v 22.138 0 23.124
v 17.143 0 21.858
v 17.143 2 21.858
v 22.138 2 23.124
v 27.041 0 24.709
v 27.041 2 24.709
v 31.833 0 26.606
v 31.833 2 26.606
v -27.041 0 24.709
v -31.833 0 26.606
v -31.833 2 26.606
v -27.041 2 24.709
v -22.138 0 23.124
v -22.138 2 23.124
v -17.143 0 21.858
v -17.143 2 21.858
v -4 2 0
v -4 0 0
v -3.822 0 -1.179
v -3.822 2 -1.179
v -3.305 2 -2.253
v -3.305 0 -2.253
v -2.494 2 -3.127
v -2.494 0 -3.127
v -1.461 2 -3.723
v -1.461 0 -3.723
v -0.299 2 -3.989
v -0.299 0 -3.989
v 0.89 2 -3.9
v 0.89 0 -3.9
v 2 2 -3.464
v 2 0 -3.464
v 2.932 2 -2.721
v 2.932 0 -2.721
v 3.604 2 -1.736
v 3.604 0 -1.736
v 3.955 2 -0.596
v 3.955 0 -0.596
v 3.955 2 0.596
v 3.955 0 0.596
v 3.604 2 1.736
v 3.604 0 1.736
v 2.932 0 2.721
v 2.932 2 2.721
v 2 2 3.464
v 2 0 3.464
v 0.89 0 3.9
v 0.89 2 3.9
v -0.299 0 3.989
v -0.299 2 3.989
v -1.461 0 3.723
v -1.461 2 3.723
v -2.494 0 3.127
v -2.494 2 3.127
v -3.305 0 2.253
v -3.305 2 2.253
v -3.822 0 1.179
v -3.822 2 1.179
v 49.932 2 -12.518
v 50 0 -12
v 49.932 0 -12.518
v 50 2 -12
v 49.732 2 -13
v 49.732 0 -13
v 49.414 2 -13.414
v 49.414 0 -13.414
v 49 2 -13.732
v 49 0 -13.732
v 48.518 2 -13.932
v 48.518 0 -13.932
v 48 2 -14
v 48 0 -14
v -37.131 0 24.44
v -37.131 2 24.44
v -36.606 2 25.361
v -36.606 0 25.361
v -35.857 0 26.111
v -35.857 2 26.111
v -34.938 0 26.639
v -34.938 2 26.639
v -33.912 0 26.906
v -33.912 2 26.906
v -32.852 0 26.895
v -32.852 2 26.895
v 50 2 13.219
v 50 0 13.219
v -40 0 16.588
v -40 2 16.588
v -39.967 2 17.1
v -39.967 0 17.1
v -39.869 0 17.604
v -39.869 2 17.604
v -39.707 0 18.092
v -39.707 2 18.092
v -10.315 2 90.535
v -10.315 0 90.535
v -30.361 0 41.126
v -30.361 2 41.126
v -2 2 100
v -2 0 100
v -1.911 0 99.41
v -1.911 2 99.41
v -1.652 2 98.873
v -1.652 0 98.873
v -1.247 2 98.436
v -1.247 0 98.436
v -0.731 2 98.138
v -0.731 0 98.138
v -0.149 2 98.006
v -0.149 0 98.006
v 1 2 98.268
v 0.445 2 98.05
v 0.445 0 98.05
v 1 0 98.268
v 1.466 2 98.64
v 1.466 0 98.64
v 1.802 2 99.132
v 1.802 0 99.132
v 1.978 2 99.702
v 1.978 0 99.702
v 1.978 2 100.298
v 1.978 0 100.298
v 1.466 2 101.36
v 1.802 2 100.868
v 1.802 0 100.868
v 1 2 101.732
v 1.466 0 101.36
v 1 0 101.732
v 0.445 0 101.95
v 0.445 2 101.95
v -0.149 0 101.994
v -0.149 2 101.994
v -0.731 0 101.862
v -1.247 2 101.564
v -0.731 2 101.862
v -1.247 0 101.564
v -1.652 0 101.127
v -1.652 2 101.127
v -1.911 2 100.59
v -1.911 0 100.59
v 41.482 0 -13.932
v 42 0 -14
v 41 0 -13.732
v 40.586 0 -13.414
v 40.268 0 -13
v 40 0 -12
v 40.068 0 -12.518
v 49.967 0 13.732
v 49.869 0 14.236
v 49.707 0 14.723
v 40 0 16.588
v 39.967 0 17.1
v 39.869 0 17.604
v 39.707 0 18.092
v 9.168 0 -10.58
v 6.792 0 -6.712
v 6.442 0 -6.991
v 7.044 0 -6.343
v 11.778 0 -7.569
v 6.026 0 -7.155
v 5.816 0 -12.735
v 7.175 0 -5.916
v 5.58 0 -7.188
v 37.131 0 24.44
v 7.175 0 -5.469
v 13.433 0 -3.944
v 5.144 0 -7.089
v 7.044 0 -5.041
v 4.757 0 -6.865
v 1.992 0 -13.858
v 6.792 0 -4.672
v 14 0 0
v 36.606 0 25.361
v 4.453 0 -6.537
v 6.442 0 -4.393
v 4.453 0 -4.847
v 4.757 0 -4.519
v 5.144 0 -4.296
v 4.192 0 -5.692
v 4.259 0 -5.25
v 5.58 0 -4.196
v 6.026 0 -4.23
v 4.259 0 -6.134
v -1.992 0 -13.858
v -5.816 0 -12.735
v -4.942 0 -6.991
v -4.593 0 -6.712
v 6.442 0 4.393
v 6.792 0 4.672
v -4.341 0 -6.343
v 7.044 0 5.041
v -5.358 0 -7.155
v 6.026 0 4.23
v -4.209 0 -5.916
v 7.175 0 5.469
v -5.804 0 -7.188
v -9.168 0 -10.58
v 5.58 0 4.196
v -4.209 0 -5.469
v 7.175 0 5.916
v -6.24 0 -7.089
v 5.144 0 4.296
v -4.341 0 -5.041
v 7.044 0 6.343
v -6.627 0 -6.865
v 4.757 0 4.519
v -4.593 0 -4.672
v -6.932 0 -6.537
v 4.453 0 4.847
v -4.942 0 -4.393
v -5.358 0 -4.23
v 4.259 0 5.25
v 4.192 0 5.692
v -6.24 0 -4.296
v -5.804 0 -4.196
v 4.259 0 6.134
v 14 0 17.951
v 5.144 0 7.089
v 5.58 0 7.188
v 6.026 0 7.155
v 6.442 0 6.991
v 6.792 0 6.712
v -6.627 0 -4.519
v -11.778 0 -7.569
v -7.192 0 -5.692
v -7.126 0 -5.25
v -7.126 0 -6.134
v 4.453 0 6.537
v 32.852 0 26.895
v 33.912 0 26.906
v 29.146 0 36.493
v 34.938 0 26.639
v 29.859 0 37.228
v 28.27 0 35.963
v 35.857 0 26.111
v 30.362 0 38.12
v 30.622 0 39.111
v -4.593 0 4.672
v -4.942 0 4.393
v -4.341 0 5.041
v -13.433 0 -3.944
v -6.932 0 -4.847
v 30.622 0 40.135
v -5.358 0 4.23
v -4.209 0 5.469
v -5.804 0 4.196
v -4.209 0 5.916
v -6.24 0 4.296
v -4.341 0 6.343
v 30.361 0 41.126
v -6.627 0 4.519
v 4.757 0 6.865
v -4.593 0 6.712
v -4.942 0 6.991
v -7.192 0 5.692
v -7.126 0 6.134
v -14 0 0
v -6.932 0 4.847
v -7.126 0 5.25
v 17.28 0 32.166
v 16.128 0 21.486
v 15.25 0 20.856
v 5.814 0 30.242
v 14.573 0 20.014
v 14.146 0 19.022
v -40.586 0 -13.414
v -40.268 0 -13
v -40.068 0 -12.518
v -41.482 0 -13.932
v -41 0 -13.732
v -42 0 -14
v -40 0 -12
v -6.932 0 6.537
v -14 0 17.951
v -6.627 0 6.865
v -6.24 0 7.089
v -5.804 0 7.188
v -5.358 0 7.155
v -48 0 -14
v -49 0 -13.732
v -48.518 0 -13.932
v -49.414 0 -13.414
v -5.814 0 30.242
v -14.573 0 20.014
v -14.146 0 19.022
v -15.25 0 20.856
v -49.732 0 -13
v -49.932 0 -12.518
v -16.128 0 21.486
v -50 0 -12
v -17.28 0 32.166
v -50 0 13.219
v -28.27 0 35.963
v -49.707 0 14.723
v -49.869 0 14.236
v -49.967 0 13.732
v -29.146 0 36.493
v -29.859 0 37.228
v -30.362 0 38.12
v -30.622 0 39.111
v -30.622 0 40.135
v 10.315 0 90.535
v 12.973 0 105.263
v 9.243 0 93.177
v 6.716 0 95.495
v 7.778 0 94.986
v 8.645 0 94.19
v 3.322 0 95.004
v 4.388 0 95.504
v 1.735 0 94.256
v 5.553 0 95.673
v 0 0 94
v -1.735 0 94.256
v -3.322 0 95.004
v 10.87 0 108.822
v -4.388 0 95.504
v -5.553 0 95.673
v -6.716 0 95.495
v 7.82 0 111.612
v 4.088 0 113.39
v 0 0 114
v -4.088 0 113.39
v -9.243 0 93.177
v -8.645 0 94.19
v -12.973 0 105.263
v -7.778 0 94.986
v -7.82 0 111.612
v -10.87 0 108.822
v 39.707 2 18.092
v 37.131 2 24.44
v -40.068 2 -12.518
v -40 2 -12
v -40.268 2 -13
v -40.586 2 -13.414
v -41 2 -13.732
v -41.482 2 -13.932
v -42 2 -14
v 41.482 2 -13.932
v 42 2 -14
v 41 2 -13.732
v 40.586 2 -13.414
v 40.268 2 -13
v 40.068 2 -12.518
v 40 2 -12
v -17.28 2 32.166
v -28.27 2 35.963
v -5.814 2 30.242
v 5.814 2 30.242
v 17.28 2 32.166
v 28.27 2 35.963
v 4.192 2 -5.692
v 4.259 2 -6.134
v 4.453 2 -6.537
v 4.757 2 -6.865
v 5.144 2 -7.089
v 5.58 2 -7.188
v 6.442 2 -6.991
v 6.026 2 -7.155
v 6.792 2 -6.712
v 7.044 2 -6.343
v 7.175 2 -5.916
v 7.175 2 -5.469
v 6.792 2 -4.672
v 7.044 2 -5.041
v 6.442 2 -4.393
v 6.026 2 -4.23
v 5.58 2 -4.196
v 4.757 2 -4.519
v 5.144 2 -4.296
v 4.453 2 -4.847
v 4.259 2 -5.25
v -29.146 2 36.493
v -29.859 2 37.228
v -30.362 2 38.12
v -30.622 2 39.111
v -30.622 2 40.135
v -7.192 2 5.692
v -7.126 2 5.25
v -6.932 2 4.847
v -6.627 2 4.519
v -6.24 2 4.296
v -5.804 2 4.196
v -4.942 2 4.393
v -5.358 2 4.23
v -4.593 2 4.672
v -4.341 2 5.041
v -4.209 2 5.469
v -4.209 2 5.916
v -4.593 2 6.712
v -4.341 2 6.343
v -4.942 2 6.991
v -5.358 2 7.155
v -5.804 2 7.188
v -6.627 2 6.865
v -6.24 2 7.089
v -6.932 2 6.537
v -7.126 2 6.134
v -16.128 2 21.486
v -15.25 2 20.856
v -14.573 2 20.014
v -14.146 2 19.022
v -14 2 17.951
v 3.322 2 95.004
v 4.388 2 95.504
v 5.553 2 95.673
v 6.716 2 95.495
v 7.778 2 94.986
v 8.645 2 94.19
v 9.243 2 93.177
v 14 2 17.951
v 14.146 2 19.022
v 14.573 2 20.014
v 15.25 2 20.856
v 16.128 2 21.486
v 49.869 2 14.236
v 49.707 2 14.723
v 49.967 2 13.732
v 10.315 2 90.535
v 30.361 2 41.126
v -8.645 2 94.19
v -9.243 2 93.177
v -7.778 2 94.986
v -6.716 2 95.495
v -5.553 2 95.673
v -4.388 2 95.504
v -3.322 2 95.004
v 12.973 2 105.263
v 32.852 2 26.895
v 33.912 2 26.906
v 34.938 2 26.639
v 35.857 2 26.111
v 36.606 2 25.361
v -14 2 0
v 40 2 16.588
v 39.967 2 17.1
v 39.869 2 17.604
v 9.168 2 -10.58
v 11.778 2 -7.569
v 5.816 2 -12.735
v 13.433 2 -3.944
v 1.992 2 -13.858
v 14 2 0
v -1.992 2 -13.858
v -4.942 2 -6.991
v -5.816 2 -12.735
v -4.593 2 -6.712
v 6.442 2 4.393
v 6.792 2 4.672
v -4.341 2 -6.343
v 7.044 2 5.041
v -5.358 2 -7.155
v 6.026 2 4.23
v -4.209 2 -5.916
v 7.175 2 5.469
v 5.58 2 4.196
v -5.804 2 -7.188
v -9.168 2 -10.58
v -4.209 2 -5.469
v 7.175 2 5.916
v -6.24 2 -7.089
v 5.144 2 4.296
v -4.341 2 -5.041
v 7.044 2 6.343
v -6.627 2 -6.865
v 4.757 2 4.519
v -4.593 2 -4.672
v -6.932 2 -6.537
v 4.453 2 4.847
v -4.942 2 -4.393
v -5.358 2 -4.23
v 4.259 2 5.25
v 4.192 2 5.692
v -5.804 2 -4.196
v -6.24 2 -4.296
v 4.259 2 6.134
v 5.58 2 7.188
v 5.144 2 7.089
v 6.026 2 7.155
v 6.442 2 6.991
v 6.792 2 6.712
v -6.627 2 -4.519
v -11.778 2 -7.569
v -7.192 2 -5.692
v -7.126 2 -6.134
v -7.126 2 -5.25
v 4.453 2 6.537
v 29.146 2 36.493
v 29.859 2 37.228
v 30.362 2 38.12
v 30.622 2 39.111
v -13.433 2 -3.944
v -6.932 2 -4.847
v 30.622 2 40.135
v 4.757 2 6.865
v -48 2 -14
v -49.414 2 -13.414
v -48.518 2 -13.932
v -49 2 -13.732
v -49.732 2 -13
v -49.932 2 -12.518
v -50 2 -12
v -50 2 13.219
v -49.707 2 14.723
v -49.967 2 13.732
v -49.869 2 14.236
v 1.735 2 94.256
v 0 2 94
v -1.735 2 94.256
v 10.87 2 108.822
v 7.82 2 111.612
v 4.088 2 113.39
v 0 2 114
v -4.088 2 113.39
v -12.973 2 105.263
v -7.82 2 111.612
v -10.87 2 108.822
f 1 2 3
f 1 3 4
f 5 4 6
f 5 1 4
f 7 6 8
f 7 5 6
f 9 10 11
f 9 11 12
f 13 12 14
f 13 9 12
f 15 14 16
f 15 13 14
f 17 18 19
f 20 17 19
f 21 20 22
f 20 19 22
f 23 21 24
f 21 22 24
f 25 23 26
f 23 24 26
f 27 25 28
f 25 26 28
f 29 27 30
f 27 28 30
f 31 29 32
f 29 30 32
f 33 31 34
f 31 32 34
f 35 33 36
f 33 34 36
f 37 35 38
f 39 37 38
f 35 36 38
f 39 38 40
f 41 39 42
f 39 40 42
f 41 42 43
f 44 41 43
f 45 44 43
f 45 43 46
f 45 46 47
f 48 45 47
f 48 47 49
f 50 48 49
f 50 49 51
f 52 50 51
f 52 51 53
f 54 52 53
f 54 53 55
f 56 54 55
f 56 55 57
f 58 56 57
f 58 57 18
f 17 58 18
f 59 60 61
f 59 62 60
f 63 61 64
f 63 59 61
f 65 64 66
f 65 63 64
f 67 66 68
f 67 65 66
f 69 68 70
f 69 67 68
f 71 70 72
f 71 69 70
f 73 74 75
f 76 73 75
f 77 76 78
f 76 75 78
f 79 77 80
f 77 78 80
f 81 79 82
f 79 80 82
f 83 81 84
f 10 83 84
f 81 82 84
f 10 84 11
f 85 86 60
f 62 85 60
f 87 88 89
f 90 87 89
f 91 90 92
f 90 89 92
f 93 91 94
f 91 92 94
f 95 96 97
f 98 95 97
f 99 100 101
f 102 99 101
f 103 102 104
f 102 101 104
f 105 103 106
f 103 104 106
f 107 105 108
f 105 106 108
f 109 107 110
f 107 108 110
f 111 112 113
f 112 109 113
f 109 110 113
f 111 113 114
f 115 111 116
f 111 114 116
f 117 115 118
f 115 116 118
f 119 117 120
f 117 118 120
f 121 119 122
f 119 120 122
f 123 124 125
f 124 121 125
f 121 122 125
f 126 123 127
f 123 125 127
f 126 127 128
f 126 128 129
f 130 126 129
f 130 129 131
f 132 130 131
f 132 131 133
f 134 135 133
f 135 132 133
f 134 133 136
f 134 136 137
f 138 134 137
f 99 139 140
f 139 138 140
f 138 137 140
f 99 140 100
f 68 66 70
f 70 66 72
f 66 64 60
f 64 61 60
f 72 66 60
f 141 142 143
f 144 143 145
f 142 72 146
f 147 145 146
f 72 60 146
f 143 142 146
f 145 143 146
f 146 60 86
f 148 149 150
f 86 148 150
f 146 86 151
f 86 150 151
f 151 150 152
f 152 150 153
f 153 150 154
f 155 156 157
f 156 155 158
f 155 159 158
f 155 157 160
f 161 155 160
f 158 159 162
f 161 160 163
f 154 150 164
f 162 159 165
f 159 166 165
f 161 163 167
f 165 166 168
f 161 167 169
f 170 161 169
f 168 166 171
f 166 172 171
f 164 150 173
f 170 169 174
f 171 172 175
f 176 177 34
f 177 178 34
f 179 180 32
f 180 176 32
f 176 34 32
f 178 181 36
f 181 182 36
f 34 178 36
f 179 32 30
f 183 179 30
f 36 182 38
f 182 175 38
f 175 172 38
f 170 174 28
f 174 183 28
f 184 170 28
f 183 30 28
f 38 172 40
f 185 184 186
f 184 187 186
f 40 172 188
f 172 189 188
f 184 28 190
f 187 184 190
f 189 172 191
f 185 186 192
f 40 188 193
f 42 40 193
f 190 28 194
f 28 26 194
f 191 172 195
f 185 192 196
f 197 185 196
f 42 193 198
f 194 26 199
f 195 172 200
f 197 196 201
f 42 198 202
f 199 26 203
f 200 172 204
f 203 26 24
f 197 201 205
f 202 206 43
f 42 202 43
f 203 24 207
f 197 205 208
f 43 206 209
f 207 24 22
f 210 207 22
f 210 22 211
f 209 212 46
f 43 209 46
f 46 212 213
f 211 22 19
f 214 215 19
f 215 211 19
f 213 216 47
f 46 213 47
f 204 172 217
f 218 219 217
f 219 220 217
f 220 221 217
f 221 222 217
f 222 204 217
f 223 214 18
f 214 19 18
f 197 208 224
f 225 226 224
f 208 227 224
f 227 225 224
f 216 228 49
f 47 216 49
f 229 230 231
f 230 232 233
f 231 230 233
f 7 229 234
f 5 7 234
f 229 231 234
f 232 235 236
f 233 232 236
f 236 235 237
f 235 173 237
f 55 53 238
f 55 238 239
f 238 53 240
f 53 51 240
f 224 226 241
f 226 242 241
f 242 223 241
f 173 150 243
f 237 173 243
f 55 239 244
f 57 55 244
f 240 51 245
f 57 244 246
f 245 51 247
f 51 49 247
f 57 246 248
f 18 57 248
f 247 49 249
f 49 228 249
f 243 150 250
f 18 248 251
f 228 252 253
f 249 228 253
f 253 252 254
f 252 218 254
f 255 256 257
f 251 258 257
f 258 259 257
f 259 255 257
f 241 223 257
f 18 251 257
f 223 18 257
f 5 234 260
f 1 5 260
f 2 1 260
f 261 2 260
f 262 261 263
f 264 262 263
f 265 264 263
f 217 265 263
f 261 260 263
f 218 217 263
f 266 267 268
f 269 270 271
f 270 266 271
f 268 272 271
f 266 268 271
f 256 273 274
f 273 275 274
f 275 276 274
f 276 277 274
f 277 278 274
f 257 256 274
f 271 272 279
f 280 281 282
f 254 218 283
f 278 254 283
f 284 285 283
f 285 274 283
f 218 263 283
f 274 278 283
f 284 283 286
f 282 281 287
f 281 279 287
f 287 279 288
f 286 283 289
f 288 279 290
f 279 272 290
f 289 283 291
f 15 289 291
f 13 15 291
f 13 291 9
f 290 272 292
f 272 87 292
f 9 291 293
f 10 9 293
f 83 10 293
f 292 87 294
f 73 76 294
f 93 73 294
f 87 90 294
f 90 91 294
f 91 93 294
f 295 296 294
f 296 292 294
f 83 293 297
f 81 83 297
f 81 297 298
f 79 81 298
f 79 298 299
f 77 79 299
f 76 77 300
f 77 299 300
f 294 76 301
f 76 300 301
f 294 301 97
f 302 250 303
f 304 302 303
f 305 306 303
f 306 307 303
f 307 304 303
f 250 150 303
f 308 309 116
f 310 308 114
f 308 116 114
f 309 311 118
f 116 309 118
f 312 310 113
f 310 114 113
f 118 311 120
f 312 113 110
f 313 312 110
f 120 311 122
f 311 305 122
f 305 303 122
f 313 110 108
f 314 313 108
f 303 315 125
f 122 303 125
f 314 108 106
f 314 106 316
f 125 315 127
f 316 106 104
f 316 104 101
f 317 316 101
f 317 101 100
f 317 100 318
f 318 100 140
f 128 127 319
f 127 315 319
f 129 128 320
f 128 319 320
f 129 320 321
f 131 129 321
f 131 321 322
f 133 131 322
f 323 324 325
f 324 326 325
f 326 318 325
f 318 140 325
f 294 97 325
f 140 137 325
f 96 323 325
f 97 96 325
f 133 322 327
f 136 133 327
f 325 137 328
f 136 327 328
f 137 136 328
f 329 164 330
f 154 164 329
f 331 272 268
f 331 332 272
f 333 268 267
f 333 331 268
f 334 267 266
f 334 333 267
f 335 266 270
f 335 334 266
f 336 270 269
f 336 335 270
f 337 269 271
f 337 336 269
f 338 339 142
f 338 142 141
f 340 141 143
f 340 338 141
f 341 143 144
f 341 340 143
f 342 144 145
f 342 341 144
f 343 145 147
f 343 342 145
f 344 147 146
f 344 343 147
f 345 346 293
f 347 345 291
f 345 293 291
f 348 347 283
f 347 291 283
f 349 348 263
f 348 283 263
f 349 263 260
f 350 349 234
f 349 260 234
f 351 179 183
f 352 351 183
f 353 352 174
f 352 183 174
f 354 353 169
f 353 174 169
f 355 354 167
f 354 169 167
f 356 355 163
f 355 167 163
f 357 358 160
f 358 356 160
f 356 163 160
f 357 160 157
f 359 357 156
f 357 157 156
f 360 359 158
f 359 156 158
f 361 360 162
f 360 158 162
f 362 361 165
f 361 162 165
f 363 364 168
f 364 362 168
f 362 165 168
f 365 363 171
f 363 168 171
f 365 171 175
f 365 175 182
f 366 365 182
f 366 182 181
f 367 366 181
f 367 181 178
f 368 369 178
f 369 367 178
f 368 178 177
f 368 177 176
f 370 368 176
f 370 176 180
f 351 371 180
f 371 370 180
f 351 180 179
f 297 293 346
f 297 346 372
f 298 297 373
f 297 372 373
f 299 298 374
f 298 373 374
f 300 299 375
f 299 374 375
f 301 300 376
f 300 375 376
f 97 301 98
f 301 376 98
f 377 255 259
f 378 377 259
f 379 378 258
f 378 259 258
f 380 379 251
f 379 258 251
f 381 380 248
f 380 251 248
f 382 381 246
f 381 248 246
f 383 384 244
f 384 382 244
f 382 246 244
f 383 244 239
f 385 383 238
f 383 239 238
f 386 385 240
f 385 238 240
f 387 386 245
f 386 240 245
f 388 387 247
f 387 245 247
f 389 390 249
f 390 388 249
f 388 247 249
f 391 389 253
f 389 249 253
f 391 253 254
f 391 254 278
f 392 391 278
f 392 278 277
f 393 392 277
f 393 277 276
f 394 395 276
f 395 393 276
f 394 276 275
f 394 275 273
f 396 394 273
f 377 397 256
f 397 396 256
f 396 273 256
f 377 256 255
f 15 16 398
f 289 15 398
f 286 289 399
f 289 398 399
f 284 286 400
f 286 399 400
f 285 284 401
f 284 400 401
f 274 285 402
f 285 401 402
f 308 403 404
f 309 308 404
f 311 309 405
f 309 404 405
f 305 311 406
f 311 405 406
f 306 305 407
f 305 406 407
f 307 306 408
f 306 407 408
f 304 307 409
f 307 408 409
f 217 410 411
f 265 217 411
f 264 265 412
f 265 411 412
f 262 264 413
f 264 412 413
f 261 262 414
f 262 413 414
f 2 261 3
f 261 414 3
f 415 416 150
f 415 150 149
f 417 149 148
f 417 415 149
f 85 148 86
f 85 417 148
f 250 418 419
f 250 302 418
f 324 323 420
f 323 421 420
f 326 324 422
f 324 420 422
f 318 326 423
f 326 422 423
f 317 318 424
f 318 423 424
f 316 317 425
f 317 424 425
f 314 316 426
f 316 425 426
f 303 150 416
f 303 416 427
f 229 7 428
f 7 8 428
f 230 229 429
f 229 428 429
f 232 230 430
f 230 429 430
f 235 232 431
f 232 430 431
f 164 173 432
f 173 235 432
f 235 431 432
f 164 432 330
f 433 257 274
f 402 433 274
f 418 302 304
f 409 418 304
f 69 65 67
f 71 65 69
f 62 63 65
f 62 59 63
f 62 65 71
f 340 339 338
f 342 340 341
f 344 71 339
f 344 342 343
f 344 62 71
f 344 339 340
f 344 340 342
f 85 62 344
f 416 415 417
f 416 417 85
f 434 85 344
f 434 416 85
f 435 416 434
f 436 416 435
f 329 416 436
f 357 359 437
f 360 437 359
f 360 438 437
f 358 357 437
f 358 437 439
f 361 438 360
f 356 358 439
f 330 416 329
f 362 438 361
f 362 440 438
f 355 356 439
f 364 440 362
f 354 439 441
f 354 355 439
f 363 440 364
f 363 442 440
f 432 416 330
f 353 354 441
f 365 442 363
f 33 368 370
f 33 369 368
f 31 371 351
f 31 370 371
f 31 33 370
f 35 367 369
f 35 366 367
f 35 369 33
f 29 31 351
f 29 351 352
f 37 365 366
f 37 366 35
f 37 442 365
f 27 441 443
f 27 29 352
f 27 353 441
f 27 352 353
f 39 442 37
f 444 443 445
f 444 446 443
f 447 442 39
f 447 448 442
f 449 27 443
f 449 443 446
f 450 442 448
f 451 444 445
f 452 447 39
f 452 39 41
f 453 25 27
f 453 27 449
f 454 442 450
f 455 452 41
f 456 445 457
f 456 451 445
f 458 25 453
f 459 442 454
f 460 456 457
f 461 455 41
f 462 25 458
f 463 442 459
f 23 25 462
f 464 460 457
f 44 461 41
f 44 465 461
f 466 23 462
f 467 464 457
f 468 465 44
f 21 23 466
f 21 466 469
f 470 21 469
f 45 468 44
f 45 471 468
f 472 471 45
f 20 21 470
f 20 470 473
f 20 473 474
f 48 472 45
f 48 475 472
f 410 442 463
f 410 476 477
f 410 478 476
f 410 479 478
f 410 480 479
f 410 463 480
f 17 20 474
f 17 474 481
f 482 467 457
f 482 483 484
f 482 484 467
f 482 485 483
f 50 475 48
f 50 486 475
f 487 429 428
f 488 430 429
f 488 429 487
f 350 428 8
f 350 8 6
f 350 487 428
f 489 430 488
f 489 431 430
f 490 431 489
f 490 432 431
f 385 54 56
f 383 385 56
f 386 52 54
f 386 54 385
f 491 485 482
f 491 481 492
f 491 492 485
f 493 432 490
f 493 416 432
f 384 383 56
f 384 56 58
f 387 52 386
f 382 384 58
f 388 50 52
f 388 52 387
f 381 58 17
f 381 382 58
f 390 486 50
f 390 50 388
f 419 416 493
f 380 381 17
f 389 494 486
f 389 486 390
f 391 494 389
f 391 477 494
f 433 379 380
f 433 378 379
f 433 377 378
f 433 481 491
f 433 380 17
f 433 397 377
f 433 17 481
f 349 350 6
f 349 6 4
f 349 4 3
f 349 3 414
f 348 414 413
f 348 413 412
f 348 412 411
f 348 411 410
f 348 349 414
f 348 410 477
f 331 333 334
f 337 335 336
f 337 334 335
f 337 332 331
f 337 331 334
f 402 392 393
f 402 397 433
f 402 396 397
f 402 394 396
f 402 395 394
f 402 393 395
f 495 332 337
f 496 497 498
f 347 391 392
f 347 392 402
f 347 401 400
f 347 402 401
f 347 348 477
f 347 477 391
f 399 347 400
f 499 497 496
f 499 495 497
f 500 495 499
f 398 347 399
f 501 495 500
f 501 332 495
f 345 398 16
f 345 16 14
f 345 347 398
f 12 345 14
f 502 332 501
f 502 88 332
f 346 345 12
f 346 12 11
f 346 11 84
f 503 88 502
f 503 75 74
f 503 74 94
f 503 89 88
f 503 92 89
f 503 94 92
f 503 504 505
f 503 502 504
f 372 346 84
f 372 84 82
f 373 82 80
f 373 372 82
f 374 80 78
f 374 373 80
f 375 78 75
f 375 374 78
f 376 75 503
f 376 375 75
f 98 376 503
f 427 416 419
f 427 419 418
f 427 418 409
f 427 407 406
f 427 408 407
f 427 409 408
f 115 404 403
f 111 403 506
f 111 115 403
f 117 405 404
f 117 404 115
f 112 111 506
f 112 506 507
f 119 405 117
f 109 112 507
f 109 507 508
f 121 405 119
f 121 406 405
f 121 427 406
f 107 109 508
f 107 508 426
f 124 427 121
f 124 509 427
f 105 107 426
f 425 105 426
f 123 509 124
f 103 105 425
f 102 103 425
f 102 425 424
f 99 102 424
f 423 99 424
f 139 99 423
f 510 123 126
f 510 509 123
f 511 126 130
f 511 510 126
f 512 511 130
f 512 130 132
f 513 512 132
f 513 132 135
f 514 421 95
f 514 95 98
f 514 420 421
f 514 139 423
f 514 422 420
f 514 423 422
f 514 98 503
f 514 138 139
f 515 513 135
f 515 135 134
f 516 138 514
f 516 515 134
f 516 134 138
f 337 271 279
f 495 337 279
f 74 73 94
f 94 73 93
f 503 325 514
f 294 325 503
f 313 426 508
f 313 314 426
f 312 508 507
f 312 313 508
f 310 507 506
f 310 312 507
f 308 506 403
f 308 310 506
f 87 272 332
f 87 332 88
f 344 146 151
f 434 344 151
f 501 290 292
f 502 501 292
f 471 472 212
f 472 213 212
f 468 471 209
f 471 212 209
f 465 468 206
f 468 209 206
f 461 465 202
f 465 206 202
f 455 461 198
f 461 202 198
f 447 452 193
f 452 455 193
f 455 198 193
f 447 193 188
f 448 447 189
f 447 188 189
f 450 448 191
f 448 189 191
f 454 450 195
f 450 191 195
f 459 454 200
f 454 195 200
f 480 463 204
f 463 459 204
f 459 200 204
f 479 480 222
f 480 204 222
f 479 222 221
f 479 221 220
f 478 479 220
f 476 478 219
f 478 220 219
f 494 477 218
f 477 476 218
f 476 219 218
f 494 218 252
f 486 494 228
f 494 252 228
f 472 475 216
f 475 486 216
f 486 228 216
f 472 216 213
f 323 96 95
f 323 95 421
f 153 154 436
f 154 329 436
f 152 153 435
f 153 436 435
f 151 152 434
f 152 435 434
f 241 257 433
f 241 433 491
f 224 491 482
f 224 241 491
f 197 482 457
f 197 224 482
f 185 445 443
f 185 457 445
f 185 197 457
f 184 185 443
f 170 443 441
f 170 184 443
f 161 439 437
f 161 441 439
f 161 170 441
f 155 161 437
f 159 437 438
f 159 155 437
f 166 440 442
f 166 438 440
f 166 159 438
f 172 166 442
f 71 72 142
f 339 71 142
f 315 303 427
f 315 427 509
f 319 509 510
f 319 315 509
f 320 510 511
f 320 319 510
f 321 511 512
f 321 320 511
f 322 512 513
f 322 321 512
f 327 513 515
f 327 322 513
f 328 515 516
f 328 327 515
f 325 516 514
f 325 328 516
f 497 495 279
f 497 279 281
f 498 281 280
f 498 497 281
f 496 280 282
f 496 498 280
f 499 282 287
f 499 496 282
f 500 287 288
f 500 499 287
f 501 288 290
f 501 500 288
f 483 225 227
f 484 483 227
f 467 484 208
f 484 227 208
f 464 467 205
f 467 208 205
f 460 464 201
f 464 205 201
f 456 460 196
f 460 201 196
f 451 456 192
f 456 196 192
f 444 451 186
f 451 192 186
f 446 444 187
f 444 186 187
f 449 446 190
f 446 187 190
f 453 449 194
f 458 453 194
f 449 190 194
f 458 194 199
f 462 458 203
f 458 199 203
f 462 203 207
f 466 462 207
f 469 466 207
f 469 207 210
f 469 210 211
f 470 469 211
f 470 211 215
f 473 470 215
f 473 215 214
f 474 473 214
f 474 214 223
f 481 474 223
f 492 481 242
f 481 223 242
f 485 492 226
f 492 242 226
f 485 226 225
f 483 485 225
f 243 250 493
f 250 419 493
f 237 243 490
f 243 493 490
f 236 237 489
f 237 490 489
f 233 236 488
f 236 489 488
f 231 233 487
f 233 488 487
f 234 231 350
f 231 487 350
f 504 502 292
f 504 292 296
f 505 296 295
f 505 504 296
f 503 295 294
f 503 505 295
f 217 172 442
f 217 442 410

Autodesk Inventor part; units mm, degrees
ref_plane "YZ Plane" through (0, 0, 0) normal (1, 0, 0) x (0, 1, 0)
ref_plane "XZ Plane" through (0, 0, 0) normal (0, 1, 0) x (-1, 0, 0)
ref_plane "XY Plane" through (0, 0, 0) normal (0, 0, 1) x (1, 0, 0)
sketch "Sketch1" plane through (0, 0, 0) normal (0, 1, 0) x (-1, 0, 0)
  line L0 (0, 0) -> (5.6922, -5.6922)
  line L1 (0, 0) -> (8.05, 0) construction
  circle A0 centre (5.6922, -5.6922) radius 1.5
  circle A1 centre (5.6922, 5.6922) radius 1.5
  circle A2 centre (-5.6922, 5.6922) radius 1.5
  circle A3 centre (-5.6922, -5.6922) radius 1.5
  circle A4 centre (0, 100) radius 14
  circle A5 centre (0, 100) radius 2
  line L2 (-50, -14) -> (50, -14)
  line L3 (50, -14) -> (50, 14)
  line L4 (50, 14) -> (-50, 14)
  line L5 (-50, 14) -> (-50, -14)
  line L6 (-50, -14) -> (50, 14) construction
  line L7 (50, -14) -> (-50, 14) construction
  circle A6 centre (0, 0) radius 14
  line L8 (-50, 14) -> (-12.9729, 105.2633)
  line L9 (12.9729, 105.2633) -> (50, 14)
  line L10 (10.3153, 90.5346) -> (41.3666, 14)
  line L11 (-10.3153, 90.5346) -> (-41.3666, 14)
  line L12 (0, 86) -> (0, 14)
  circle A7 centre (0, 100) radius 6
  line L13 (-10.3153, 90.5346) -> (-5.5598, 102.2557)
  line L14 (10.3153, 90.5346) -> (5.5598, 102.2557)
  line L15 (-40, 14) -> (-40, -14)
  line L16 (40, 13) -> (40, -14)
  circle A8 centre (0, 0) radius 4
  circle A9 centre (0, 100) radius 70
  circle A10 centre (0, 100) radius 80
  line L17 (-40, 14) -> (-40, 30.718)
  line L18 (-14, 0) -> (-14, 21.2345)
  line L19 (14, 0) -> (14, 21.2345)
  line L20 (40, 13) -> (40, 30.718)
  line L21 (41.3666, 14) -> (40, 12.0487)
  line L22 (-41.3666, 14) -> (-40, 17.3685)
  point P0 (4, 86.5836)
  point P1 (2.5, 14)
  point P2 (-4, 86.5836)
  point P3 (4, 95.5279)
  point P4 (-4, 95.5279)
  point P5 (4.6667, 30.1557)
  point P6 (-4.6667, 30.1557)
  point P7 (31.7797, 37.6297)
  point P8 (-31.7797, 37.6297)
  point P9 (-42.585, 32.2762)
  point P10 (-14, 14)
  point P11 (14, 14)
  point P12 (42.585, 32.2762)
  point P13 (40, 14)
  point P14 (40, 38.6477)
  point P15 (0, 14)
  point P16 (-40, 38.6477)
  point P17 (-40, 17.3685)
  point P18 (-35.5513, 28.3334)
  point P19 (40, 17.3685)
  point P20 (35.5513, 28.3334)
  dimension "d7" = 28
  dimension "d0" = 8.05
  dimension "d1" = 45
  dimension "d2" = 3
  dimension "d5" = 360
  dimension "d9" = 4
  dimension "d10" = 100
  dimension "d11" = 28
  dimension "d12" = 28
  dimension "d13" = 8
  dimension "d14" = 8
  dimension "d20" = 10
  dimension "d22" = 10
  dimension "d24" = 8
  dimension "d26" = 140
  dimension "d29" = 10
  dimension "d30" = 100
extrude "Extrusion1" add sketch "Sketch1" along normal blind 2 contours A4 L14 A7 L13 | A4 L9 A9 L10 | A4 L11 A9 L8 | L9 A10 L10 A9 | L10 A10 L12 A9 | A7 | A9 L11 A10 L8 | L9 L4 L10 L20 A10 | L12 A10 L11 A9 | A10 L20 L10 | A10 L17 L11 L4 L8 | L3 L2 L16 L21 L4 | A10 L19 L4 L12 | L12 L4 L18 A10 | L10 L4 L20 | L11 L17 A10 | L4 L15 L2 L5 | L21 L16 L20 L4 | A6 L18 L4 | L4 L19 A6 | A6 | L17 L4 L11 picked at (9.3983, 95.3801)
fillet "Fillet1" radius 4 6 edges at (5.5598, 1, 102.2557) (-5.5598, 1, 102.2557) (50, 1, 14) (-50, 1, 14) (-31.7797, 1, 37.6297) (31.7797, 1, 37.6297)
fillet "Fillet2" radius 4 6 edges at (14, 1, 21.2345) (-14, 1, 21.2345) (35.5513, 1, 28.3334) (40, 1, 17.3685) (-35.5513, 1, 28.3334) (-40, 1, 17.3685)
fillet "Fillet3" radius 2 4 edges at (-40, 1, -14) (50, 1, -14) (40, 1, -14) (-50, 1, -14)
equation "\"d14\" = d13"
equation "\"d20\" = d22"
properties part number "frame_rotor" material "Aluminum 6061"
